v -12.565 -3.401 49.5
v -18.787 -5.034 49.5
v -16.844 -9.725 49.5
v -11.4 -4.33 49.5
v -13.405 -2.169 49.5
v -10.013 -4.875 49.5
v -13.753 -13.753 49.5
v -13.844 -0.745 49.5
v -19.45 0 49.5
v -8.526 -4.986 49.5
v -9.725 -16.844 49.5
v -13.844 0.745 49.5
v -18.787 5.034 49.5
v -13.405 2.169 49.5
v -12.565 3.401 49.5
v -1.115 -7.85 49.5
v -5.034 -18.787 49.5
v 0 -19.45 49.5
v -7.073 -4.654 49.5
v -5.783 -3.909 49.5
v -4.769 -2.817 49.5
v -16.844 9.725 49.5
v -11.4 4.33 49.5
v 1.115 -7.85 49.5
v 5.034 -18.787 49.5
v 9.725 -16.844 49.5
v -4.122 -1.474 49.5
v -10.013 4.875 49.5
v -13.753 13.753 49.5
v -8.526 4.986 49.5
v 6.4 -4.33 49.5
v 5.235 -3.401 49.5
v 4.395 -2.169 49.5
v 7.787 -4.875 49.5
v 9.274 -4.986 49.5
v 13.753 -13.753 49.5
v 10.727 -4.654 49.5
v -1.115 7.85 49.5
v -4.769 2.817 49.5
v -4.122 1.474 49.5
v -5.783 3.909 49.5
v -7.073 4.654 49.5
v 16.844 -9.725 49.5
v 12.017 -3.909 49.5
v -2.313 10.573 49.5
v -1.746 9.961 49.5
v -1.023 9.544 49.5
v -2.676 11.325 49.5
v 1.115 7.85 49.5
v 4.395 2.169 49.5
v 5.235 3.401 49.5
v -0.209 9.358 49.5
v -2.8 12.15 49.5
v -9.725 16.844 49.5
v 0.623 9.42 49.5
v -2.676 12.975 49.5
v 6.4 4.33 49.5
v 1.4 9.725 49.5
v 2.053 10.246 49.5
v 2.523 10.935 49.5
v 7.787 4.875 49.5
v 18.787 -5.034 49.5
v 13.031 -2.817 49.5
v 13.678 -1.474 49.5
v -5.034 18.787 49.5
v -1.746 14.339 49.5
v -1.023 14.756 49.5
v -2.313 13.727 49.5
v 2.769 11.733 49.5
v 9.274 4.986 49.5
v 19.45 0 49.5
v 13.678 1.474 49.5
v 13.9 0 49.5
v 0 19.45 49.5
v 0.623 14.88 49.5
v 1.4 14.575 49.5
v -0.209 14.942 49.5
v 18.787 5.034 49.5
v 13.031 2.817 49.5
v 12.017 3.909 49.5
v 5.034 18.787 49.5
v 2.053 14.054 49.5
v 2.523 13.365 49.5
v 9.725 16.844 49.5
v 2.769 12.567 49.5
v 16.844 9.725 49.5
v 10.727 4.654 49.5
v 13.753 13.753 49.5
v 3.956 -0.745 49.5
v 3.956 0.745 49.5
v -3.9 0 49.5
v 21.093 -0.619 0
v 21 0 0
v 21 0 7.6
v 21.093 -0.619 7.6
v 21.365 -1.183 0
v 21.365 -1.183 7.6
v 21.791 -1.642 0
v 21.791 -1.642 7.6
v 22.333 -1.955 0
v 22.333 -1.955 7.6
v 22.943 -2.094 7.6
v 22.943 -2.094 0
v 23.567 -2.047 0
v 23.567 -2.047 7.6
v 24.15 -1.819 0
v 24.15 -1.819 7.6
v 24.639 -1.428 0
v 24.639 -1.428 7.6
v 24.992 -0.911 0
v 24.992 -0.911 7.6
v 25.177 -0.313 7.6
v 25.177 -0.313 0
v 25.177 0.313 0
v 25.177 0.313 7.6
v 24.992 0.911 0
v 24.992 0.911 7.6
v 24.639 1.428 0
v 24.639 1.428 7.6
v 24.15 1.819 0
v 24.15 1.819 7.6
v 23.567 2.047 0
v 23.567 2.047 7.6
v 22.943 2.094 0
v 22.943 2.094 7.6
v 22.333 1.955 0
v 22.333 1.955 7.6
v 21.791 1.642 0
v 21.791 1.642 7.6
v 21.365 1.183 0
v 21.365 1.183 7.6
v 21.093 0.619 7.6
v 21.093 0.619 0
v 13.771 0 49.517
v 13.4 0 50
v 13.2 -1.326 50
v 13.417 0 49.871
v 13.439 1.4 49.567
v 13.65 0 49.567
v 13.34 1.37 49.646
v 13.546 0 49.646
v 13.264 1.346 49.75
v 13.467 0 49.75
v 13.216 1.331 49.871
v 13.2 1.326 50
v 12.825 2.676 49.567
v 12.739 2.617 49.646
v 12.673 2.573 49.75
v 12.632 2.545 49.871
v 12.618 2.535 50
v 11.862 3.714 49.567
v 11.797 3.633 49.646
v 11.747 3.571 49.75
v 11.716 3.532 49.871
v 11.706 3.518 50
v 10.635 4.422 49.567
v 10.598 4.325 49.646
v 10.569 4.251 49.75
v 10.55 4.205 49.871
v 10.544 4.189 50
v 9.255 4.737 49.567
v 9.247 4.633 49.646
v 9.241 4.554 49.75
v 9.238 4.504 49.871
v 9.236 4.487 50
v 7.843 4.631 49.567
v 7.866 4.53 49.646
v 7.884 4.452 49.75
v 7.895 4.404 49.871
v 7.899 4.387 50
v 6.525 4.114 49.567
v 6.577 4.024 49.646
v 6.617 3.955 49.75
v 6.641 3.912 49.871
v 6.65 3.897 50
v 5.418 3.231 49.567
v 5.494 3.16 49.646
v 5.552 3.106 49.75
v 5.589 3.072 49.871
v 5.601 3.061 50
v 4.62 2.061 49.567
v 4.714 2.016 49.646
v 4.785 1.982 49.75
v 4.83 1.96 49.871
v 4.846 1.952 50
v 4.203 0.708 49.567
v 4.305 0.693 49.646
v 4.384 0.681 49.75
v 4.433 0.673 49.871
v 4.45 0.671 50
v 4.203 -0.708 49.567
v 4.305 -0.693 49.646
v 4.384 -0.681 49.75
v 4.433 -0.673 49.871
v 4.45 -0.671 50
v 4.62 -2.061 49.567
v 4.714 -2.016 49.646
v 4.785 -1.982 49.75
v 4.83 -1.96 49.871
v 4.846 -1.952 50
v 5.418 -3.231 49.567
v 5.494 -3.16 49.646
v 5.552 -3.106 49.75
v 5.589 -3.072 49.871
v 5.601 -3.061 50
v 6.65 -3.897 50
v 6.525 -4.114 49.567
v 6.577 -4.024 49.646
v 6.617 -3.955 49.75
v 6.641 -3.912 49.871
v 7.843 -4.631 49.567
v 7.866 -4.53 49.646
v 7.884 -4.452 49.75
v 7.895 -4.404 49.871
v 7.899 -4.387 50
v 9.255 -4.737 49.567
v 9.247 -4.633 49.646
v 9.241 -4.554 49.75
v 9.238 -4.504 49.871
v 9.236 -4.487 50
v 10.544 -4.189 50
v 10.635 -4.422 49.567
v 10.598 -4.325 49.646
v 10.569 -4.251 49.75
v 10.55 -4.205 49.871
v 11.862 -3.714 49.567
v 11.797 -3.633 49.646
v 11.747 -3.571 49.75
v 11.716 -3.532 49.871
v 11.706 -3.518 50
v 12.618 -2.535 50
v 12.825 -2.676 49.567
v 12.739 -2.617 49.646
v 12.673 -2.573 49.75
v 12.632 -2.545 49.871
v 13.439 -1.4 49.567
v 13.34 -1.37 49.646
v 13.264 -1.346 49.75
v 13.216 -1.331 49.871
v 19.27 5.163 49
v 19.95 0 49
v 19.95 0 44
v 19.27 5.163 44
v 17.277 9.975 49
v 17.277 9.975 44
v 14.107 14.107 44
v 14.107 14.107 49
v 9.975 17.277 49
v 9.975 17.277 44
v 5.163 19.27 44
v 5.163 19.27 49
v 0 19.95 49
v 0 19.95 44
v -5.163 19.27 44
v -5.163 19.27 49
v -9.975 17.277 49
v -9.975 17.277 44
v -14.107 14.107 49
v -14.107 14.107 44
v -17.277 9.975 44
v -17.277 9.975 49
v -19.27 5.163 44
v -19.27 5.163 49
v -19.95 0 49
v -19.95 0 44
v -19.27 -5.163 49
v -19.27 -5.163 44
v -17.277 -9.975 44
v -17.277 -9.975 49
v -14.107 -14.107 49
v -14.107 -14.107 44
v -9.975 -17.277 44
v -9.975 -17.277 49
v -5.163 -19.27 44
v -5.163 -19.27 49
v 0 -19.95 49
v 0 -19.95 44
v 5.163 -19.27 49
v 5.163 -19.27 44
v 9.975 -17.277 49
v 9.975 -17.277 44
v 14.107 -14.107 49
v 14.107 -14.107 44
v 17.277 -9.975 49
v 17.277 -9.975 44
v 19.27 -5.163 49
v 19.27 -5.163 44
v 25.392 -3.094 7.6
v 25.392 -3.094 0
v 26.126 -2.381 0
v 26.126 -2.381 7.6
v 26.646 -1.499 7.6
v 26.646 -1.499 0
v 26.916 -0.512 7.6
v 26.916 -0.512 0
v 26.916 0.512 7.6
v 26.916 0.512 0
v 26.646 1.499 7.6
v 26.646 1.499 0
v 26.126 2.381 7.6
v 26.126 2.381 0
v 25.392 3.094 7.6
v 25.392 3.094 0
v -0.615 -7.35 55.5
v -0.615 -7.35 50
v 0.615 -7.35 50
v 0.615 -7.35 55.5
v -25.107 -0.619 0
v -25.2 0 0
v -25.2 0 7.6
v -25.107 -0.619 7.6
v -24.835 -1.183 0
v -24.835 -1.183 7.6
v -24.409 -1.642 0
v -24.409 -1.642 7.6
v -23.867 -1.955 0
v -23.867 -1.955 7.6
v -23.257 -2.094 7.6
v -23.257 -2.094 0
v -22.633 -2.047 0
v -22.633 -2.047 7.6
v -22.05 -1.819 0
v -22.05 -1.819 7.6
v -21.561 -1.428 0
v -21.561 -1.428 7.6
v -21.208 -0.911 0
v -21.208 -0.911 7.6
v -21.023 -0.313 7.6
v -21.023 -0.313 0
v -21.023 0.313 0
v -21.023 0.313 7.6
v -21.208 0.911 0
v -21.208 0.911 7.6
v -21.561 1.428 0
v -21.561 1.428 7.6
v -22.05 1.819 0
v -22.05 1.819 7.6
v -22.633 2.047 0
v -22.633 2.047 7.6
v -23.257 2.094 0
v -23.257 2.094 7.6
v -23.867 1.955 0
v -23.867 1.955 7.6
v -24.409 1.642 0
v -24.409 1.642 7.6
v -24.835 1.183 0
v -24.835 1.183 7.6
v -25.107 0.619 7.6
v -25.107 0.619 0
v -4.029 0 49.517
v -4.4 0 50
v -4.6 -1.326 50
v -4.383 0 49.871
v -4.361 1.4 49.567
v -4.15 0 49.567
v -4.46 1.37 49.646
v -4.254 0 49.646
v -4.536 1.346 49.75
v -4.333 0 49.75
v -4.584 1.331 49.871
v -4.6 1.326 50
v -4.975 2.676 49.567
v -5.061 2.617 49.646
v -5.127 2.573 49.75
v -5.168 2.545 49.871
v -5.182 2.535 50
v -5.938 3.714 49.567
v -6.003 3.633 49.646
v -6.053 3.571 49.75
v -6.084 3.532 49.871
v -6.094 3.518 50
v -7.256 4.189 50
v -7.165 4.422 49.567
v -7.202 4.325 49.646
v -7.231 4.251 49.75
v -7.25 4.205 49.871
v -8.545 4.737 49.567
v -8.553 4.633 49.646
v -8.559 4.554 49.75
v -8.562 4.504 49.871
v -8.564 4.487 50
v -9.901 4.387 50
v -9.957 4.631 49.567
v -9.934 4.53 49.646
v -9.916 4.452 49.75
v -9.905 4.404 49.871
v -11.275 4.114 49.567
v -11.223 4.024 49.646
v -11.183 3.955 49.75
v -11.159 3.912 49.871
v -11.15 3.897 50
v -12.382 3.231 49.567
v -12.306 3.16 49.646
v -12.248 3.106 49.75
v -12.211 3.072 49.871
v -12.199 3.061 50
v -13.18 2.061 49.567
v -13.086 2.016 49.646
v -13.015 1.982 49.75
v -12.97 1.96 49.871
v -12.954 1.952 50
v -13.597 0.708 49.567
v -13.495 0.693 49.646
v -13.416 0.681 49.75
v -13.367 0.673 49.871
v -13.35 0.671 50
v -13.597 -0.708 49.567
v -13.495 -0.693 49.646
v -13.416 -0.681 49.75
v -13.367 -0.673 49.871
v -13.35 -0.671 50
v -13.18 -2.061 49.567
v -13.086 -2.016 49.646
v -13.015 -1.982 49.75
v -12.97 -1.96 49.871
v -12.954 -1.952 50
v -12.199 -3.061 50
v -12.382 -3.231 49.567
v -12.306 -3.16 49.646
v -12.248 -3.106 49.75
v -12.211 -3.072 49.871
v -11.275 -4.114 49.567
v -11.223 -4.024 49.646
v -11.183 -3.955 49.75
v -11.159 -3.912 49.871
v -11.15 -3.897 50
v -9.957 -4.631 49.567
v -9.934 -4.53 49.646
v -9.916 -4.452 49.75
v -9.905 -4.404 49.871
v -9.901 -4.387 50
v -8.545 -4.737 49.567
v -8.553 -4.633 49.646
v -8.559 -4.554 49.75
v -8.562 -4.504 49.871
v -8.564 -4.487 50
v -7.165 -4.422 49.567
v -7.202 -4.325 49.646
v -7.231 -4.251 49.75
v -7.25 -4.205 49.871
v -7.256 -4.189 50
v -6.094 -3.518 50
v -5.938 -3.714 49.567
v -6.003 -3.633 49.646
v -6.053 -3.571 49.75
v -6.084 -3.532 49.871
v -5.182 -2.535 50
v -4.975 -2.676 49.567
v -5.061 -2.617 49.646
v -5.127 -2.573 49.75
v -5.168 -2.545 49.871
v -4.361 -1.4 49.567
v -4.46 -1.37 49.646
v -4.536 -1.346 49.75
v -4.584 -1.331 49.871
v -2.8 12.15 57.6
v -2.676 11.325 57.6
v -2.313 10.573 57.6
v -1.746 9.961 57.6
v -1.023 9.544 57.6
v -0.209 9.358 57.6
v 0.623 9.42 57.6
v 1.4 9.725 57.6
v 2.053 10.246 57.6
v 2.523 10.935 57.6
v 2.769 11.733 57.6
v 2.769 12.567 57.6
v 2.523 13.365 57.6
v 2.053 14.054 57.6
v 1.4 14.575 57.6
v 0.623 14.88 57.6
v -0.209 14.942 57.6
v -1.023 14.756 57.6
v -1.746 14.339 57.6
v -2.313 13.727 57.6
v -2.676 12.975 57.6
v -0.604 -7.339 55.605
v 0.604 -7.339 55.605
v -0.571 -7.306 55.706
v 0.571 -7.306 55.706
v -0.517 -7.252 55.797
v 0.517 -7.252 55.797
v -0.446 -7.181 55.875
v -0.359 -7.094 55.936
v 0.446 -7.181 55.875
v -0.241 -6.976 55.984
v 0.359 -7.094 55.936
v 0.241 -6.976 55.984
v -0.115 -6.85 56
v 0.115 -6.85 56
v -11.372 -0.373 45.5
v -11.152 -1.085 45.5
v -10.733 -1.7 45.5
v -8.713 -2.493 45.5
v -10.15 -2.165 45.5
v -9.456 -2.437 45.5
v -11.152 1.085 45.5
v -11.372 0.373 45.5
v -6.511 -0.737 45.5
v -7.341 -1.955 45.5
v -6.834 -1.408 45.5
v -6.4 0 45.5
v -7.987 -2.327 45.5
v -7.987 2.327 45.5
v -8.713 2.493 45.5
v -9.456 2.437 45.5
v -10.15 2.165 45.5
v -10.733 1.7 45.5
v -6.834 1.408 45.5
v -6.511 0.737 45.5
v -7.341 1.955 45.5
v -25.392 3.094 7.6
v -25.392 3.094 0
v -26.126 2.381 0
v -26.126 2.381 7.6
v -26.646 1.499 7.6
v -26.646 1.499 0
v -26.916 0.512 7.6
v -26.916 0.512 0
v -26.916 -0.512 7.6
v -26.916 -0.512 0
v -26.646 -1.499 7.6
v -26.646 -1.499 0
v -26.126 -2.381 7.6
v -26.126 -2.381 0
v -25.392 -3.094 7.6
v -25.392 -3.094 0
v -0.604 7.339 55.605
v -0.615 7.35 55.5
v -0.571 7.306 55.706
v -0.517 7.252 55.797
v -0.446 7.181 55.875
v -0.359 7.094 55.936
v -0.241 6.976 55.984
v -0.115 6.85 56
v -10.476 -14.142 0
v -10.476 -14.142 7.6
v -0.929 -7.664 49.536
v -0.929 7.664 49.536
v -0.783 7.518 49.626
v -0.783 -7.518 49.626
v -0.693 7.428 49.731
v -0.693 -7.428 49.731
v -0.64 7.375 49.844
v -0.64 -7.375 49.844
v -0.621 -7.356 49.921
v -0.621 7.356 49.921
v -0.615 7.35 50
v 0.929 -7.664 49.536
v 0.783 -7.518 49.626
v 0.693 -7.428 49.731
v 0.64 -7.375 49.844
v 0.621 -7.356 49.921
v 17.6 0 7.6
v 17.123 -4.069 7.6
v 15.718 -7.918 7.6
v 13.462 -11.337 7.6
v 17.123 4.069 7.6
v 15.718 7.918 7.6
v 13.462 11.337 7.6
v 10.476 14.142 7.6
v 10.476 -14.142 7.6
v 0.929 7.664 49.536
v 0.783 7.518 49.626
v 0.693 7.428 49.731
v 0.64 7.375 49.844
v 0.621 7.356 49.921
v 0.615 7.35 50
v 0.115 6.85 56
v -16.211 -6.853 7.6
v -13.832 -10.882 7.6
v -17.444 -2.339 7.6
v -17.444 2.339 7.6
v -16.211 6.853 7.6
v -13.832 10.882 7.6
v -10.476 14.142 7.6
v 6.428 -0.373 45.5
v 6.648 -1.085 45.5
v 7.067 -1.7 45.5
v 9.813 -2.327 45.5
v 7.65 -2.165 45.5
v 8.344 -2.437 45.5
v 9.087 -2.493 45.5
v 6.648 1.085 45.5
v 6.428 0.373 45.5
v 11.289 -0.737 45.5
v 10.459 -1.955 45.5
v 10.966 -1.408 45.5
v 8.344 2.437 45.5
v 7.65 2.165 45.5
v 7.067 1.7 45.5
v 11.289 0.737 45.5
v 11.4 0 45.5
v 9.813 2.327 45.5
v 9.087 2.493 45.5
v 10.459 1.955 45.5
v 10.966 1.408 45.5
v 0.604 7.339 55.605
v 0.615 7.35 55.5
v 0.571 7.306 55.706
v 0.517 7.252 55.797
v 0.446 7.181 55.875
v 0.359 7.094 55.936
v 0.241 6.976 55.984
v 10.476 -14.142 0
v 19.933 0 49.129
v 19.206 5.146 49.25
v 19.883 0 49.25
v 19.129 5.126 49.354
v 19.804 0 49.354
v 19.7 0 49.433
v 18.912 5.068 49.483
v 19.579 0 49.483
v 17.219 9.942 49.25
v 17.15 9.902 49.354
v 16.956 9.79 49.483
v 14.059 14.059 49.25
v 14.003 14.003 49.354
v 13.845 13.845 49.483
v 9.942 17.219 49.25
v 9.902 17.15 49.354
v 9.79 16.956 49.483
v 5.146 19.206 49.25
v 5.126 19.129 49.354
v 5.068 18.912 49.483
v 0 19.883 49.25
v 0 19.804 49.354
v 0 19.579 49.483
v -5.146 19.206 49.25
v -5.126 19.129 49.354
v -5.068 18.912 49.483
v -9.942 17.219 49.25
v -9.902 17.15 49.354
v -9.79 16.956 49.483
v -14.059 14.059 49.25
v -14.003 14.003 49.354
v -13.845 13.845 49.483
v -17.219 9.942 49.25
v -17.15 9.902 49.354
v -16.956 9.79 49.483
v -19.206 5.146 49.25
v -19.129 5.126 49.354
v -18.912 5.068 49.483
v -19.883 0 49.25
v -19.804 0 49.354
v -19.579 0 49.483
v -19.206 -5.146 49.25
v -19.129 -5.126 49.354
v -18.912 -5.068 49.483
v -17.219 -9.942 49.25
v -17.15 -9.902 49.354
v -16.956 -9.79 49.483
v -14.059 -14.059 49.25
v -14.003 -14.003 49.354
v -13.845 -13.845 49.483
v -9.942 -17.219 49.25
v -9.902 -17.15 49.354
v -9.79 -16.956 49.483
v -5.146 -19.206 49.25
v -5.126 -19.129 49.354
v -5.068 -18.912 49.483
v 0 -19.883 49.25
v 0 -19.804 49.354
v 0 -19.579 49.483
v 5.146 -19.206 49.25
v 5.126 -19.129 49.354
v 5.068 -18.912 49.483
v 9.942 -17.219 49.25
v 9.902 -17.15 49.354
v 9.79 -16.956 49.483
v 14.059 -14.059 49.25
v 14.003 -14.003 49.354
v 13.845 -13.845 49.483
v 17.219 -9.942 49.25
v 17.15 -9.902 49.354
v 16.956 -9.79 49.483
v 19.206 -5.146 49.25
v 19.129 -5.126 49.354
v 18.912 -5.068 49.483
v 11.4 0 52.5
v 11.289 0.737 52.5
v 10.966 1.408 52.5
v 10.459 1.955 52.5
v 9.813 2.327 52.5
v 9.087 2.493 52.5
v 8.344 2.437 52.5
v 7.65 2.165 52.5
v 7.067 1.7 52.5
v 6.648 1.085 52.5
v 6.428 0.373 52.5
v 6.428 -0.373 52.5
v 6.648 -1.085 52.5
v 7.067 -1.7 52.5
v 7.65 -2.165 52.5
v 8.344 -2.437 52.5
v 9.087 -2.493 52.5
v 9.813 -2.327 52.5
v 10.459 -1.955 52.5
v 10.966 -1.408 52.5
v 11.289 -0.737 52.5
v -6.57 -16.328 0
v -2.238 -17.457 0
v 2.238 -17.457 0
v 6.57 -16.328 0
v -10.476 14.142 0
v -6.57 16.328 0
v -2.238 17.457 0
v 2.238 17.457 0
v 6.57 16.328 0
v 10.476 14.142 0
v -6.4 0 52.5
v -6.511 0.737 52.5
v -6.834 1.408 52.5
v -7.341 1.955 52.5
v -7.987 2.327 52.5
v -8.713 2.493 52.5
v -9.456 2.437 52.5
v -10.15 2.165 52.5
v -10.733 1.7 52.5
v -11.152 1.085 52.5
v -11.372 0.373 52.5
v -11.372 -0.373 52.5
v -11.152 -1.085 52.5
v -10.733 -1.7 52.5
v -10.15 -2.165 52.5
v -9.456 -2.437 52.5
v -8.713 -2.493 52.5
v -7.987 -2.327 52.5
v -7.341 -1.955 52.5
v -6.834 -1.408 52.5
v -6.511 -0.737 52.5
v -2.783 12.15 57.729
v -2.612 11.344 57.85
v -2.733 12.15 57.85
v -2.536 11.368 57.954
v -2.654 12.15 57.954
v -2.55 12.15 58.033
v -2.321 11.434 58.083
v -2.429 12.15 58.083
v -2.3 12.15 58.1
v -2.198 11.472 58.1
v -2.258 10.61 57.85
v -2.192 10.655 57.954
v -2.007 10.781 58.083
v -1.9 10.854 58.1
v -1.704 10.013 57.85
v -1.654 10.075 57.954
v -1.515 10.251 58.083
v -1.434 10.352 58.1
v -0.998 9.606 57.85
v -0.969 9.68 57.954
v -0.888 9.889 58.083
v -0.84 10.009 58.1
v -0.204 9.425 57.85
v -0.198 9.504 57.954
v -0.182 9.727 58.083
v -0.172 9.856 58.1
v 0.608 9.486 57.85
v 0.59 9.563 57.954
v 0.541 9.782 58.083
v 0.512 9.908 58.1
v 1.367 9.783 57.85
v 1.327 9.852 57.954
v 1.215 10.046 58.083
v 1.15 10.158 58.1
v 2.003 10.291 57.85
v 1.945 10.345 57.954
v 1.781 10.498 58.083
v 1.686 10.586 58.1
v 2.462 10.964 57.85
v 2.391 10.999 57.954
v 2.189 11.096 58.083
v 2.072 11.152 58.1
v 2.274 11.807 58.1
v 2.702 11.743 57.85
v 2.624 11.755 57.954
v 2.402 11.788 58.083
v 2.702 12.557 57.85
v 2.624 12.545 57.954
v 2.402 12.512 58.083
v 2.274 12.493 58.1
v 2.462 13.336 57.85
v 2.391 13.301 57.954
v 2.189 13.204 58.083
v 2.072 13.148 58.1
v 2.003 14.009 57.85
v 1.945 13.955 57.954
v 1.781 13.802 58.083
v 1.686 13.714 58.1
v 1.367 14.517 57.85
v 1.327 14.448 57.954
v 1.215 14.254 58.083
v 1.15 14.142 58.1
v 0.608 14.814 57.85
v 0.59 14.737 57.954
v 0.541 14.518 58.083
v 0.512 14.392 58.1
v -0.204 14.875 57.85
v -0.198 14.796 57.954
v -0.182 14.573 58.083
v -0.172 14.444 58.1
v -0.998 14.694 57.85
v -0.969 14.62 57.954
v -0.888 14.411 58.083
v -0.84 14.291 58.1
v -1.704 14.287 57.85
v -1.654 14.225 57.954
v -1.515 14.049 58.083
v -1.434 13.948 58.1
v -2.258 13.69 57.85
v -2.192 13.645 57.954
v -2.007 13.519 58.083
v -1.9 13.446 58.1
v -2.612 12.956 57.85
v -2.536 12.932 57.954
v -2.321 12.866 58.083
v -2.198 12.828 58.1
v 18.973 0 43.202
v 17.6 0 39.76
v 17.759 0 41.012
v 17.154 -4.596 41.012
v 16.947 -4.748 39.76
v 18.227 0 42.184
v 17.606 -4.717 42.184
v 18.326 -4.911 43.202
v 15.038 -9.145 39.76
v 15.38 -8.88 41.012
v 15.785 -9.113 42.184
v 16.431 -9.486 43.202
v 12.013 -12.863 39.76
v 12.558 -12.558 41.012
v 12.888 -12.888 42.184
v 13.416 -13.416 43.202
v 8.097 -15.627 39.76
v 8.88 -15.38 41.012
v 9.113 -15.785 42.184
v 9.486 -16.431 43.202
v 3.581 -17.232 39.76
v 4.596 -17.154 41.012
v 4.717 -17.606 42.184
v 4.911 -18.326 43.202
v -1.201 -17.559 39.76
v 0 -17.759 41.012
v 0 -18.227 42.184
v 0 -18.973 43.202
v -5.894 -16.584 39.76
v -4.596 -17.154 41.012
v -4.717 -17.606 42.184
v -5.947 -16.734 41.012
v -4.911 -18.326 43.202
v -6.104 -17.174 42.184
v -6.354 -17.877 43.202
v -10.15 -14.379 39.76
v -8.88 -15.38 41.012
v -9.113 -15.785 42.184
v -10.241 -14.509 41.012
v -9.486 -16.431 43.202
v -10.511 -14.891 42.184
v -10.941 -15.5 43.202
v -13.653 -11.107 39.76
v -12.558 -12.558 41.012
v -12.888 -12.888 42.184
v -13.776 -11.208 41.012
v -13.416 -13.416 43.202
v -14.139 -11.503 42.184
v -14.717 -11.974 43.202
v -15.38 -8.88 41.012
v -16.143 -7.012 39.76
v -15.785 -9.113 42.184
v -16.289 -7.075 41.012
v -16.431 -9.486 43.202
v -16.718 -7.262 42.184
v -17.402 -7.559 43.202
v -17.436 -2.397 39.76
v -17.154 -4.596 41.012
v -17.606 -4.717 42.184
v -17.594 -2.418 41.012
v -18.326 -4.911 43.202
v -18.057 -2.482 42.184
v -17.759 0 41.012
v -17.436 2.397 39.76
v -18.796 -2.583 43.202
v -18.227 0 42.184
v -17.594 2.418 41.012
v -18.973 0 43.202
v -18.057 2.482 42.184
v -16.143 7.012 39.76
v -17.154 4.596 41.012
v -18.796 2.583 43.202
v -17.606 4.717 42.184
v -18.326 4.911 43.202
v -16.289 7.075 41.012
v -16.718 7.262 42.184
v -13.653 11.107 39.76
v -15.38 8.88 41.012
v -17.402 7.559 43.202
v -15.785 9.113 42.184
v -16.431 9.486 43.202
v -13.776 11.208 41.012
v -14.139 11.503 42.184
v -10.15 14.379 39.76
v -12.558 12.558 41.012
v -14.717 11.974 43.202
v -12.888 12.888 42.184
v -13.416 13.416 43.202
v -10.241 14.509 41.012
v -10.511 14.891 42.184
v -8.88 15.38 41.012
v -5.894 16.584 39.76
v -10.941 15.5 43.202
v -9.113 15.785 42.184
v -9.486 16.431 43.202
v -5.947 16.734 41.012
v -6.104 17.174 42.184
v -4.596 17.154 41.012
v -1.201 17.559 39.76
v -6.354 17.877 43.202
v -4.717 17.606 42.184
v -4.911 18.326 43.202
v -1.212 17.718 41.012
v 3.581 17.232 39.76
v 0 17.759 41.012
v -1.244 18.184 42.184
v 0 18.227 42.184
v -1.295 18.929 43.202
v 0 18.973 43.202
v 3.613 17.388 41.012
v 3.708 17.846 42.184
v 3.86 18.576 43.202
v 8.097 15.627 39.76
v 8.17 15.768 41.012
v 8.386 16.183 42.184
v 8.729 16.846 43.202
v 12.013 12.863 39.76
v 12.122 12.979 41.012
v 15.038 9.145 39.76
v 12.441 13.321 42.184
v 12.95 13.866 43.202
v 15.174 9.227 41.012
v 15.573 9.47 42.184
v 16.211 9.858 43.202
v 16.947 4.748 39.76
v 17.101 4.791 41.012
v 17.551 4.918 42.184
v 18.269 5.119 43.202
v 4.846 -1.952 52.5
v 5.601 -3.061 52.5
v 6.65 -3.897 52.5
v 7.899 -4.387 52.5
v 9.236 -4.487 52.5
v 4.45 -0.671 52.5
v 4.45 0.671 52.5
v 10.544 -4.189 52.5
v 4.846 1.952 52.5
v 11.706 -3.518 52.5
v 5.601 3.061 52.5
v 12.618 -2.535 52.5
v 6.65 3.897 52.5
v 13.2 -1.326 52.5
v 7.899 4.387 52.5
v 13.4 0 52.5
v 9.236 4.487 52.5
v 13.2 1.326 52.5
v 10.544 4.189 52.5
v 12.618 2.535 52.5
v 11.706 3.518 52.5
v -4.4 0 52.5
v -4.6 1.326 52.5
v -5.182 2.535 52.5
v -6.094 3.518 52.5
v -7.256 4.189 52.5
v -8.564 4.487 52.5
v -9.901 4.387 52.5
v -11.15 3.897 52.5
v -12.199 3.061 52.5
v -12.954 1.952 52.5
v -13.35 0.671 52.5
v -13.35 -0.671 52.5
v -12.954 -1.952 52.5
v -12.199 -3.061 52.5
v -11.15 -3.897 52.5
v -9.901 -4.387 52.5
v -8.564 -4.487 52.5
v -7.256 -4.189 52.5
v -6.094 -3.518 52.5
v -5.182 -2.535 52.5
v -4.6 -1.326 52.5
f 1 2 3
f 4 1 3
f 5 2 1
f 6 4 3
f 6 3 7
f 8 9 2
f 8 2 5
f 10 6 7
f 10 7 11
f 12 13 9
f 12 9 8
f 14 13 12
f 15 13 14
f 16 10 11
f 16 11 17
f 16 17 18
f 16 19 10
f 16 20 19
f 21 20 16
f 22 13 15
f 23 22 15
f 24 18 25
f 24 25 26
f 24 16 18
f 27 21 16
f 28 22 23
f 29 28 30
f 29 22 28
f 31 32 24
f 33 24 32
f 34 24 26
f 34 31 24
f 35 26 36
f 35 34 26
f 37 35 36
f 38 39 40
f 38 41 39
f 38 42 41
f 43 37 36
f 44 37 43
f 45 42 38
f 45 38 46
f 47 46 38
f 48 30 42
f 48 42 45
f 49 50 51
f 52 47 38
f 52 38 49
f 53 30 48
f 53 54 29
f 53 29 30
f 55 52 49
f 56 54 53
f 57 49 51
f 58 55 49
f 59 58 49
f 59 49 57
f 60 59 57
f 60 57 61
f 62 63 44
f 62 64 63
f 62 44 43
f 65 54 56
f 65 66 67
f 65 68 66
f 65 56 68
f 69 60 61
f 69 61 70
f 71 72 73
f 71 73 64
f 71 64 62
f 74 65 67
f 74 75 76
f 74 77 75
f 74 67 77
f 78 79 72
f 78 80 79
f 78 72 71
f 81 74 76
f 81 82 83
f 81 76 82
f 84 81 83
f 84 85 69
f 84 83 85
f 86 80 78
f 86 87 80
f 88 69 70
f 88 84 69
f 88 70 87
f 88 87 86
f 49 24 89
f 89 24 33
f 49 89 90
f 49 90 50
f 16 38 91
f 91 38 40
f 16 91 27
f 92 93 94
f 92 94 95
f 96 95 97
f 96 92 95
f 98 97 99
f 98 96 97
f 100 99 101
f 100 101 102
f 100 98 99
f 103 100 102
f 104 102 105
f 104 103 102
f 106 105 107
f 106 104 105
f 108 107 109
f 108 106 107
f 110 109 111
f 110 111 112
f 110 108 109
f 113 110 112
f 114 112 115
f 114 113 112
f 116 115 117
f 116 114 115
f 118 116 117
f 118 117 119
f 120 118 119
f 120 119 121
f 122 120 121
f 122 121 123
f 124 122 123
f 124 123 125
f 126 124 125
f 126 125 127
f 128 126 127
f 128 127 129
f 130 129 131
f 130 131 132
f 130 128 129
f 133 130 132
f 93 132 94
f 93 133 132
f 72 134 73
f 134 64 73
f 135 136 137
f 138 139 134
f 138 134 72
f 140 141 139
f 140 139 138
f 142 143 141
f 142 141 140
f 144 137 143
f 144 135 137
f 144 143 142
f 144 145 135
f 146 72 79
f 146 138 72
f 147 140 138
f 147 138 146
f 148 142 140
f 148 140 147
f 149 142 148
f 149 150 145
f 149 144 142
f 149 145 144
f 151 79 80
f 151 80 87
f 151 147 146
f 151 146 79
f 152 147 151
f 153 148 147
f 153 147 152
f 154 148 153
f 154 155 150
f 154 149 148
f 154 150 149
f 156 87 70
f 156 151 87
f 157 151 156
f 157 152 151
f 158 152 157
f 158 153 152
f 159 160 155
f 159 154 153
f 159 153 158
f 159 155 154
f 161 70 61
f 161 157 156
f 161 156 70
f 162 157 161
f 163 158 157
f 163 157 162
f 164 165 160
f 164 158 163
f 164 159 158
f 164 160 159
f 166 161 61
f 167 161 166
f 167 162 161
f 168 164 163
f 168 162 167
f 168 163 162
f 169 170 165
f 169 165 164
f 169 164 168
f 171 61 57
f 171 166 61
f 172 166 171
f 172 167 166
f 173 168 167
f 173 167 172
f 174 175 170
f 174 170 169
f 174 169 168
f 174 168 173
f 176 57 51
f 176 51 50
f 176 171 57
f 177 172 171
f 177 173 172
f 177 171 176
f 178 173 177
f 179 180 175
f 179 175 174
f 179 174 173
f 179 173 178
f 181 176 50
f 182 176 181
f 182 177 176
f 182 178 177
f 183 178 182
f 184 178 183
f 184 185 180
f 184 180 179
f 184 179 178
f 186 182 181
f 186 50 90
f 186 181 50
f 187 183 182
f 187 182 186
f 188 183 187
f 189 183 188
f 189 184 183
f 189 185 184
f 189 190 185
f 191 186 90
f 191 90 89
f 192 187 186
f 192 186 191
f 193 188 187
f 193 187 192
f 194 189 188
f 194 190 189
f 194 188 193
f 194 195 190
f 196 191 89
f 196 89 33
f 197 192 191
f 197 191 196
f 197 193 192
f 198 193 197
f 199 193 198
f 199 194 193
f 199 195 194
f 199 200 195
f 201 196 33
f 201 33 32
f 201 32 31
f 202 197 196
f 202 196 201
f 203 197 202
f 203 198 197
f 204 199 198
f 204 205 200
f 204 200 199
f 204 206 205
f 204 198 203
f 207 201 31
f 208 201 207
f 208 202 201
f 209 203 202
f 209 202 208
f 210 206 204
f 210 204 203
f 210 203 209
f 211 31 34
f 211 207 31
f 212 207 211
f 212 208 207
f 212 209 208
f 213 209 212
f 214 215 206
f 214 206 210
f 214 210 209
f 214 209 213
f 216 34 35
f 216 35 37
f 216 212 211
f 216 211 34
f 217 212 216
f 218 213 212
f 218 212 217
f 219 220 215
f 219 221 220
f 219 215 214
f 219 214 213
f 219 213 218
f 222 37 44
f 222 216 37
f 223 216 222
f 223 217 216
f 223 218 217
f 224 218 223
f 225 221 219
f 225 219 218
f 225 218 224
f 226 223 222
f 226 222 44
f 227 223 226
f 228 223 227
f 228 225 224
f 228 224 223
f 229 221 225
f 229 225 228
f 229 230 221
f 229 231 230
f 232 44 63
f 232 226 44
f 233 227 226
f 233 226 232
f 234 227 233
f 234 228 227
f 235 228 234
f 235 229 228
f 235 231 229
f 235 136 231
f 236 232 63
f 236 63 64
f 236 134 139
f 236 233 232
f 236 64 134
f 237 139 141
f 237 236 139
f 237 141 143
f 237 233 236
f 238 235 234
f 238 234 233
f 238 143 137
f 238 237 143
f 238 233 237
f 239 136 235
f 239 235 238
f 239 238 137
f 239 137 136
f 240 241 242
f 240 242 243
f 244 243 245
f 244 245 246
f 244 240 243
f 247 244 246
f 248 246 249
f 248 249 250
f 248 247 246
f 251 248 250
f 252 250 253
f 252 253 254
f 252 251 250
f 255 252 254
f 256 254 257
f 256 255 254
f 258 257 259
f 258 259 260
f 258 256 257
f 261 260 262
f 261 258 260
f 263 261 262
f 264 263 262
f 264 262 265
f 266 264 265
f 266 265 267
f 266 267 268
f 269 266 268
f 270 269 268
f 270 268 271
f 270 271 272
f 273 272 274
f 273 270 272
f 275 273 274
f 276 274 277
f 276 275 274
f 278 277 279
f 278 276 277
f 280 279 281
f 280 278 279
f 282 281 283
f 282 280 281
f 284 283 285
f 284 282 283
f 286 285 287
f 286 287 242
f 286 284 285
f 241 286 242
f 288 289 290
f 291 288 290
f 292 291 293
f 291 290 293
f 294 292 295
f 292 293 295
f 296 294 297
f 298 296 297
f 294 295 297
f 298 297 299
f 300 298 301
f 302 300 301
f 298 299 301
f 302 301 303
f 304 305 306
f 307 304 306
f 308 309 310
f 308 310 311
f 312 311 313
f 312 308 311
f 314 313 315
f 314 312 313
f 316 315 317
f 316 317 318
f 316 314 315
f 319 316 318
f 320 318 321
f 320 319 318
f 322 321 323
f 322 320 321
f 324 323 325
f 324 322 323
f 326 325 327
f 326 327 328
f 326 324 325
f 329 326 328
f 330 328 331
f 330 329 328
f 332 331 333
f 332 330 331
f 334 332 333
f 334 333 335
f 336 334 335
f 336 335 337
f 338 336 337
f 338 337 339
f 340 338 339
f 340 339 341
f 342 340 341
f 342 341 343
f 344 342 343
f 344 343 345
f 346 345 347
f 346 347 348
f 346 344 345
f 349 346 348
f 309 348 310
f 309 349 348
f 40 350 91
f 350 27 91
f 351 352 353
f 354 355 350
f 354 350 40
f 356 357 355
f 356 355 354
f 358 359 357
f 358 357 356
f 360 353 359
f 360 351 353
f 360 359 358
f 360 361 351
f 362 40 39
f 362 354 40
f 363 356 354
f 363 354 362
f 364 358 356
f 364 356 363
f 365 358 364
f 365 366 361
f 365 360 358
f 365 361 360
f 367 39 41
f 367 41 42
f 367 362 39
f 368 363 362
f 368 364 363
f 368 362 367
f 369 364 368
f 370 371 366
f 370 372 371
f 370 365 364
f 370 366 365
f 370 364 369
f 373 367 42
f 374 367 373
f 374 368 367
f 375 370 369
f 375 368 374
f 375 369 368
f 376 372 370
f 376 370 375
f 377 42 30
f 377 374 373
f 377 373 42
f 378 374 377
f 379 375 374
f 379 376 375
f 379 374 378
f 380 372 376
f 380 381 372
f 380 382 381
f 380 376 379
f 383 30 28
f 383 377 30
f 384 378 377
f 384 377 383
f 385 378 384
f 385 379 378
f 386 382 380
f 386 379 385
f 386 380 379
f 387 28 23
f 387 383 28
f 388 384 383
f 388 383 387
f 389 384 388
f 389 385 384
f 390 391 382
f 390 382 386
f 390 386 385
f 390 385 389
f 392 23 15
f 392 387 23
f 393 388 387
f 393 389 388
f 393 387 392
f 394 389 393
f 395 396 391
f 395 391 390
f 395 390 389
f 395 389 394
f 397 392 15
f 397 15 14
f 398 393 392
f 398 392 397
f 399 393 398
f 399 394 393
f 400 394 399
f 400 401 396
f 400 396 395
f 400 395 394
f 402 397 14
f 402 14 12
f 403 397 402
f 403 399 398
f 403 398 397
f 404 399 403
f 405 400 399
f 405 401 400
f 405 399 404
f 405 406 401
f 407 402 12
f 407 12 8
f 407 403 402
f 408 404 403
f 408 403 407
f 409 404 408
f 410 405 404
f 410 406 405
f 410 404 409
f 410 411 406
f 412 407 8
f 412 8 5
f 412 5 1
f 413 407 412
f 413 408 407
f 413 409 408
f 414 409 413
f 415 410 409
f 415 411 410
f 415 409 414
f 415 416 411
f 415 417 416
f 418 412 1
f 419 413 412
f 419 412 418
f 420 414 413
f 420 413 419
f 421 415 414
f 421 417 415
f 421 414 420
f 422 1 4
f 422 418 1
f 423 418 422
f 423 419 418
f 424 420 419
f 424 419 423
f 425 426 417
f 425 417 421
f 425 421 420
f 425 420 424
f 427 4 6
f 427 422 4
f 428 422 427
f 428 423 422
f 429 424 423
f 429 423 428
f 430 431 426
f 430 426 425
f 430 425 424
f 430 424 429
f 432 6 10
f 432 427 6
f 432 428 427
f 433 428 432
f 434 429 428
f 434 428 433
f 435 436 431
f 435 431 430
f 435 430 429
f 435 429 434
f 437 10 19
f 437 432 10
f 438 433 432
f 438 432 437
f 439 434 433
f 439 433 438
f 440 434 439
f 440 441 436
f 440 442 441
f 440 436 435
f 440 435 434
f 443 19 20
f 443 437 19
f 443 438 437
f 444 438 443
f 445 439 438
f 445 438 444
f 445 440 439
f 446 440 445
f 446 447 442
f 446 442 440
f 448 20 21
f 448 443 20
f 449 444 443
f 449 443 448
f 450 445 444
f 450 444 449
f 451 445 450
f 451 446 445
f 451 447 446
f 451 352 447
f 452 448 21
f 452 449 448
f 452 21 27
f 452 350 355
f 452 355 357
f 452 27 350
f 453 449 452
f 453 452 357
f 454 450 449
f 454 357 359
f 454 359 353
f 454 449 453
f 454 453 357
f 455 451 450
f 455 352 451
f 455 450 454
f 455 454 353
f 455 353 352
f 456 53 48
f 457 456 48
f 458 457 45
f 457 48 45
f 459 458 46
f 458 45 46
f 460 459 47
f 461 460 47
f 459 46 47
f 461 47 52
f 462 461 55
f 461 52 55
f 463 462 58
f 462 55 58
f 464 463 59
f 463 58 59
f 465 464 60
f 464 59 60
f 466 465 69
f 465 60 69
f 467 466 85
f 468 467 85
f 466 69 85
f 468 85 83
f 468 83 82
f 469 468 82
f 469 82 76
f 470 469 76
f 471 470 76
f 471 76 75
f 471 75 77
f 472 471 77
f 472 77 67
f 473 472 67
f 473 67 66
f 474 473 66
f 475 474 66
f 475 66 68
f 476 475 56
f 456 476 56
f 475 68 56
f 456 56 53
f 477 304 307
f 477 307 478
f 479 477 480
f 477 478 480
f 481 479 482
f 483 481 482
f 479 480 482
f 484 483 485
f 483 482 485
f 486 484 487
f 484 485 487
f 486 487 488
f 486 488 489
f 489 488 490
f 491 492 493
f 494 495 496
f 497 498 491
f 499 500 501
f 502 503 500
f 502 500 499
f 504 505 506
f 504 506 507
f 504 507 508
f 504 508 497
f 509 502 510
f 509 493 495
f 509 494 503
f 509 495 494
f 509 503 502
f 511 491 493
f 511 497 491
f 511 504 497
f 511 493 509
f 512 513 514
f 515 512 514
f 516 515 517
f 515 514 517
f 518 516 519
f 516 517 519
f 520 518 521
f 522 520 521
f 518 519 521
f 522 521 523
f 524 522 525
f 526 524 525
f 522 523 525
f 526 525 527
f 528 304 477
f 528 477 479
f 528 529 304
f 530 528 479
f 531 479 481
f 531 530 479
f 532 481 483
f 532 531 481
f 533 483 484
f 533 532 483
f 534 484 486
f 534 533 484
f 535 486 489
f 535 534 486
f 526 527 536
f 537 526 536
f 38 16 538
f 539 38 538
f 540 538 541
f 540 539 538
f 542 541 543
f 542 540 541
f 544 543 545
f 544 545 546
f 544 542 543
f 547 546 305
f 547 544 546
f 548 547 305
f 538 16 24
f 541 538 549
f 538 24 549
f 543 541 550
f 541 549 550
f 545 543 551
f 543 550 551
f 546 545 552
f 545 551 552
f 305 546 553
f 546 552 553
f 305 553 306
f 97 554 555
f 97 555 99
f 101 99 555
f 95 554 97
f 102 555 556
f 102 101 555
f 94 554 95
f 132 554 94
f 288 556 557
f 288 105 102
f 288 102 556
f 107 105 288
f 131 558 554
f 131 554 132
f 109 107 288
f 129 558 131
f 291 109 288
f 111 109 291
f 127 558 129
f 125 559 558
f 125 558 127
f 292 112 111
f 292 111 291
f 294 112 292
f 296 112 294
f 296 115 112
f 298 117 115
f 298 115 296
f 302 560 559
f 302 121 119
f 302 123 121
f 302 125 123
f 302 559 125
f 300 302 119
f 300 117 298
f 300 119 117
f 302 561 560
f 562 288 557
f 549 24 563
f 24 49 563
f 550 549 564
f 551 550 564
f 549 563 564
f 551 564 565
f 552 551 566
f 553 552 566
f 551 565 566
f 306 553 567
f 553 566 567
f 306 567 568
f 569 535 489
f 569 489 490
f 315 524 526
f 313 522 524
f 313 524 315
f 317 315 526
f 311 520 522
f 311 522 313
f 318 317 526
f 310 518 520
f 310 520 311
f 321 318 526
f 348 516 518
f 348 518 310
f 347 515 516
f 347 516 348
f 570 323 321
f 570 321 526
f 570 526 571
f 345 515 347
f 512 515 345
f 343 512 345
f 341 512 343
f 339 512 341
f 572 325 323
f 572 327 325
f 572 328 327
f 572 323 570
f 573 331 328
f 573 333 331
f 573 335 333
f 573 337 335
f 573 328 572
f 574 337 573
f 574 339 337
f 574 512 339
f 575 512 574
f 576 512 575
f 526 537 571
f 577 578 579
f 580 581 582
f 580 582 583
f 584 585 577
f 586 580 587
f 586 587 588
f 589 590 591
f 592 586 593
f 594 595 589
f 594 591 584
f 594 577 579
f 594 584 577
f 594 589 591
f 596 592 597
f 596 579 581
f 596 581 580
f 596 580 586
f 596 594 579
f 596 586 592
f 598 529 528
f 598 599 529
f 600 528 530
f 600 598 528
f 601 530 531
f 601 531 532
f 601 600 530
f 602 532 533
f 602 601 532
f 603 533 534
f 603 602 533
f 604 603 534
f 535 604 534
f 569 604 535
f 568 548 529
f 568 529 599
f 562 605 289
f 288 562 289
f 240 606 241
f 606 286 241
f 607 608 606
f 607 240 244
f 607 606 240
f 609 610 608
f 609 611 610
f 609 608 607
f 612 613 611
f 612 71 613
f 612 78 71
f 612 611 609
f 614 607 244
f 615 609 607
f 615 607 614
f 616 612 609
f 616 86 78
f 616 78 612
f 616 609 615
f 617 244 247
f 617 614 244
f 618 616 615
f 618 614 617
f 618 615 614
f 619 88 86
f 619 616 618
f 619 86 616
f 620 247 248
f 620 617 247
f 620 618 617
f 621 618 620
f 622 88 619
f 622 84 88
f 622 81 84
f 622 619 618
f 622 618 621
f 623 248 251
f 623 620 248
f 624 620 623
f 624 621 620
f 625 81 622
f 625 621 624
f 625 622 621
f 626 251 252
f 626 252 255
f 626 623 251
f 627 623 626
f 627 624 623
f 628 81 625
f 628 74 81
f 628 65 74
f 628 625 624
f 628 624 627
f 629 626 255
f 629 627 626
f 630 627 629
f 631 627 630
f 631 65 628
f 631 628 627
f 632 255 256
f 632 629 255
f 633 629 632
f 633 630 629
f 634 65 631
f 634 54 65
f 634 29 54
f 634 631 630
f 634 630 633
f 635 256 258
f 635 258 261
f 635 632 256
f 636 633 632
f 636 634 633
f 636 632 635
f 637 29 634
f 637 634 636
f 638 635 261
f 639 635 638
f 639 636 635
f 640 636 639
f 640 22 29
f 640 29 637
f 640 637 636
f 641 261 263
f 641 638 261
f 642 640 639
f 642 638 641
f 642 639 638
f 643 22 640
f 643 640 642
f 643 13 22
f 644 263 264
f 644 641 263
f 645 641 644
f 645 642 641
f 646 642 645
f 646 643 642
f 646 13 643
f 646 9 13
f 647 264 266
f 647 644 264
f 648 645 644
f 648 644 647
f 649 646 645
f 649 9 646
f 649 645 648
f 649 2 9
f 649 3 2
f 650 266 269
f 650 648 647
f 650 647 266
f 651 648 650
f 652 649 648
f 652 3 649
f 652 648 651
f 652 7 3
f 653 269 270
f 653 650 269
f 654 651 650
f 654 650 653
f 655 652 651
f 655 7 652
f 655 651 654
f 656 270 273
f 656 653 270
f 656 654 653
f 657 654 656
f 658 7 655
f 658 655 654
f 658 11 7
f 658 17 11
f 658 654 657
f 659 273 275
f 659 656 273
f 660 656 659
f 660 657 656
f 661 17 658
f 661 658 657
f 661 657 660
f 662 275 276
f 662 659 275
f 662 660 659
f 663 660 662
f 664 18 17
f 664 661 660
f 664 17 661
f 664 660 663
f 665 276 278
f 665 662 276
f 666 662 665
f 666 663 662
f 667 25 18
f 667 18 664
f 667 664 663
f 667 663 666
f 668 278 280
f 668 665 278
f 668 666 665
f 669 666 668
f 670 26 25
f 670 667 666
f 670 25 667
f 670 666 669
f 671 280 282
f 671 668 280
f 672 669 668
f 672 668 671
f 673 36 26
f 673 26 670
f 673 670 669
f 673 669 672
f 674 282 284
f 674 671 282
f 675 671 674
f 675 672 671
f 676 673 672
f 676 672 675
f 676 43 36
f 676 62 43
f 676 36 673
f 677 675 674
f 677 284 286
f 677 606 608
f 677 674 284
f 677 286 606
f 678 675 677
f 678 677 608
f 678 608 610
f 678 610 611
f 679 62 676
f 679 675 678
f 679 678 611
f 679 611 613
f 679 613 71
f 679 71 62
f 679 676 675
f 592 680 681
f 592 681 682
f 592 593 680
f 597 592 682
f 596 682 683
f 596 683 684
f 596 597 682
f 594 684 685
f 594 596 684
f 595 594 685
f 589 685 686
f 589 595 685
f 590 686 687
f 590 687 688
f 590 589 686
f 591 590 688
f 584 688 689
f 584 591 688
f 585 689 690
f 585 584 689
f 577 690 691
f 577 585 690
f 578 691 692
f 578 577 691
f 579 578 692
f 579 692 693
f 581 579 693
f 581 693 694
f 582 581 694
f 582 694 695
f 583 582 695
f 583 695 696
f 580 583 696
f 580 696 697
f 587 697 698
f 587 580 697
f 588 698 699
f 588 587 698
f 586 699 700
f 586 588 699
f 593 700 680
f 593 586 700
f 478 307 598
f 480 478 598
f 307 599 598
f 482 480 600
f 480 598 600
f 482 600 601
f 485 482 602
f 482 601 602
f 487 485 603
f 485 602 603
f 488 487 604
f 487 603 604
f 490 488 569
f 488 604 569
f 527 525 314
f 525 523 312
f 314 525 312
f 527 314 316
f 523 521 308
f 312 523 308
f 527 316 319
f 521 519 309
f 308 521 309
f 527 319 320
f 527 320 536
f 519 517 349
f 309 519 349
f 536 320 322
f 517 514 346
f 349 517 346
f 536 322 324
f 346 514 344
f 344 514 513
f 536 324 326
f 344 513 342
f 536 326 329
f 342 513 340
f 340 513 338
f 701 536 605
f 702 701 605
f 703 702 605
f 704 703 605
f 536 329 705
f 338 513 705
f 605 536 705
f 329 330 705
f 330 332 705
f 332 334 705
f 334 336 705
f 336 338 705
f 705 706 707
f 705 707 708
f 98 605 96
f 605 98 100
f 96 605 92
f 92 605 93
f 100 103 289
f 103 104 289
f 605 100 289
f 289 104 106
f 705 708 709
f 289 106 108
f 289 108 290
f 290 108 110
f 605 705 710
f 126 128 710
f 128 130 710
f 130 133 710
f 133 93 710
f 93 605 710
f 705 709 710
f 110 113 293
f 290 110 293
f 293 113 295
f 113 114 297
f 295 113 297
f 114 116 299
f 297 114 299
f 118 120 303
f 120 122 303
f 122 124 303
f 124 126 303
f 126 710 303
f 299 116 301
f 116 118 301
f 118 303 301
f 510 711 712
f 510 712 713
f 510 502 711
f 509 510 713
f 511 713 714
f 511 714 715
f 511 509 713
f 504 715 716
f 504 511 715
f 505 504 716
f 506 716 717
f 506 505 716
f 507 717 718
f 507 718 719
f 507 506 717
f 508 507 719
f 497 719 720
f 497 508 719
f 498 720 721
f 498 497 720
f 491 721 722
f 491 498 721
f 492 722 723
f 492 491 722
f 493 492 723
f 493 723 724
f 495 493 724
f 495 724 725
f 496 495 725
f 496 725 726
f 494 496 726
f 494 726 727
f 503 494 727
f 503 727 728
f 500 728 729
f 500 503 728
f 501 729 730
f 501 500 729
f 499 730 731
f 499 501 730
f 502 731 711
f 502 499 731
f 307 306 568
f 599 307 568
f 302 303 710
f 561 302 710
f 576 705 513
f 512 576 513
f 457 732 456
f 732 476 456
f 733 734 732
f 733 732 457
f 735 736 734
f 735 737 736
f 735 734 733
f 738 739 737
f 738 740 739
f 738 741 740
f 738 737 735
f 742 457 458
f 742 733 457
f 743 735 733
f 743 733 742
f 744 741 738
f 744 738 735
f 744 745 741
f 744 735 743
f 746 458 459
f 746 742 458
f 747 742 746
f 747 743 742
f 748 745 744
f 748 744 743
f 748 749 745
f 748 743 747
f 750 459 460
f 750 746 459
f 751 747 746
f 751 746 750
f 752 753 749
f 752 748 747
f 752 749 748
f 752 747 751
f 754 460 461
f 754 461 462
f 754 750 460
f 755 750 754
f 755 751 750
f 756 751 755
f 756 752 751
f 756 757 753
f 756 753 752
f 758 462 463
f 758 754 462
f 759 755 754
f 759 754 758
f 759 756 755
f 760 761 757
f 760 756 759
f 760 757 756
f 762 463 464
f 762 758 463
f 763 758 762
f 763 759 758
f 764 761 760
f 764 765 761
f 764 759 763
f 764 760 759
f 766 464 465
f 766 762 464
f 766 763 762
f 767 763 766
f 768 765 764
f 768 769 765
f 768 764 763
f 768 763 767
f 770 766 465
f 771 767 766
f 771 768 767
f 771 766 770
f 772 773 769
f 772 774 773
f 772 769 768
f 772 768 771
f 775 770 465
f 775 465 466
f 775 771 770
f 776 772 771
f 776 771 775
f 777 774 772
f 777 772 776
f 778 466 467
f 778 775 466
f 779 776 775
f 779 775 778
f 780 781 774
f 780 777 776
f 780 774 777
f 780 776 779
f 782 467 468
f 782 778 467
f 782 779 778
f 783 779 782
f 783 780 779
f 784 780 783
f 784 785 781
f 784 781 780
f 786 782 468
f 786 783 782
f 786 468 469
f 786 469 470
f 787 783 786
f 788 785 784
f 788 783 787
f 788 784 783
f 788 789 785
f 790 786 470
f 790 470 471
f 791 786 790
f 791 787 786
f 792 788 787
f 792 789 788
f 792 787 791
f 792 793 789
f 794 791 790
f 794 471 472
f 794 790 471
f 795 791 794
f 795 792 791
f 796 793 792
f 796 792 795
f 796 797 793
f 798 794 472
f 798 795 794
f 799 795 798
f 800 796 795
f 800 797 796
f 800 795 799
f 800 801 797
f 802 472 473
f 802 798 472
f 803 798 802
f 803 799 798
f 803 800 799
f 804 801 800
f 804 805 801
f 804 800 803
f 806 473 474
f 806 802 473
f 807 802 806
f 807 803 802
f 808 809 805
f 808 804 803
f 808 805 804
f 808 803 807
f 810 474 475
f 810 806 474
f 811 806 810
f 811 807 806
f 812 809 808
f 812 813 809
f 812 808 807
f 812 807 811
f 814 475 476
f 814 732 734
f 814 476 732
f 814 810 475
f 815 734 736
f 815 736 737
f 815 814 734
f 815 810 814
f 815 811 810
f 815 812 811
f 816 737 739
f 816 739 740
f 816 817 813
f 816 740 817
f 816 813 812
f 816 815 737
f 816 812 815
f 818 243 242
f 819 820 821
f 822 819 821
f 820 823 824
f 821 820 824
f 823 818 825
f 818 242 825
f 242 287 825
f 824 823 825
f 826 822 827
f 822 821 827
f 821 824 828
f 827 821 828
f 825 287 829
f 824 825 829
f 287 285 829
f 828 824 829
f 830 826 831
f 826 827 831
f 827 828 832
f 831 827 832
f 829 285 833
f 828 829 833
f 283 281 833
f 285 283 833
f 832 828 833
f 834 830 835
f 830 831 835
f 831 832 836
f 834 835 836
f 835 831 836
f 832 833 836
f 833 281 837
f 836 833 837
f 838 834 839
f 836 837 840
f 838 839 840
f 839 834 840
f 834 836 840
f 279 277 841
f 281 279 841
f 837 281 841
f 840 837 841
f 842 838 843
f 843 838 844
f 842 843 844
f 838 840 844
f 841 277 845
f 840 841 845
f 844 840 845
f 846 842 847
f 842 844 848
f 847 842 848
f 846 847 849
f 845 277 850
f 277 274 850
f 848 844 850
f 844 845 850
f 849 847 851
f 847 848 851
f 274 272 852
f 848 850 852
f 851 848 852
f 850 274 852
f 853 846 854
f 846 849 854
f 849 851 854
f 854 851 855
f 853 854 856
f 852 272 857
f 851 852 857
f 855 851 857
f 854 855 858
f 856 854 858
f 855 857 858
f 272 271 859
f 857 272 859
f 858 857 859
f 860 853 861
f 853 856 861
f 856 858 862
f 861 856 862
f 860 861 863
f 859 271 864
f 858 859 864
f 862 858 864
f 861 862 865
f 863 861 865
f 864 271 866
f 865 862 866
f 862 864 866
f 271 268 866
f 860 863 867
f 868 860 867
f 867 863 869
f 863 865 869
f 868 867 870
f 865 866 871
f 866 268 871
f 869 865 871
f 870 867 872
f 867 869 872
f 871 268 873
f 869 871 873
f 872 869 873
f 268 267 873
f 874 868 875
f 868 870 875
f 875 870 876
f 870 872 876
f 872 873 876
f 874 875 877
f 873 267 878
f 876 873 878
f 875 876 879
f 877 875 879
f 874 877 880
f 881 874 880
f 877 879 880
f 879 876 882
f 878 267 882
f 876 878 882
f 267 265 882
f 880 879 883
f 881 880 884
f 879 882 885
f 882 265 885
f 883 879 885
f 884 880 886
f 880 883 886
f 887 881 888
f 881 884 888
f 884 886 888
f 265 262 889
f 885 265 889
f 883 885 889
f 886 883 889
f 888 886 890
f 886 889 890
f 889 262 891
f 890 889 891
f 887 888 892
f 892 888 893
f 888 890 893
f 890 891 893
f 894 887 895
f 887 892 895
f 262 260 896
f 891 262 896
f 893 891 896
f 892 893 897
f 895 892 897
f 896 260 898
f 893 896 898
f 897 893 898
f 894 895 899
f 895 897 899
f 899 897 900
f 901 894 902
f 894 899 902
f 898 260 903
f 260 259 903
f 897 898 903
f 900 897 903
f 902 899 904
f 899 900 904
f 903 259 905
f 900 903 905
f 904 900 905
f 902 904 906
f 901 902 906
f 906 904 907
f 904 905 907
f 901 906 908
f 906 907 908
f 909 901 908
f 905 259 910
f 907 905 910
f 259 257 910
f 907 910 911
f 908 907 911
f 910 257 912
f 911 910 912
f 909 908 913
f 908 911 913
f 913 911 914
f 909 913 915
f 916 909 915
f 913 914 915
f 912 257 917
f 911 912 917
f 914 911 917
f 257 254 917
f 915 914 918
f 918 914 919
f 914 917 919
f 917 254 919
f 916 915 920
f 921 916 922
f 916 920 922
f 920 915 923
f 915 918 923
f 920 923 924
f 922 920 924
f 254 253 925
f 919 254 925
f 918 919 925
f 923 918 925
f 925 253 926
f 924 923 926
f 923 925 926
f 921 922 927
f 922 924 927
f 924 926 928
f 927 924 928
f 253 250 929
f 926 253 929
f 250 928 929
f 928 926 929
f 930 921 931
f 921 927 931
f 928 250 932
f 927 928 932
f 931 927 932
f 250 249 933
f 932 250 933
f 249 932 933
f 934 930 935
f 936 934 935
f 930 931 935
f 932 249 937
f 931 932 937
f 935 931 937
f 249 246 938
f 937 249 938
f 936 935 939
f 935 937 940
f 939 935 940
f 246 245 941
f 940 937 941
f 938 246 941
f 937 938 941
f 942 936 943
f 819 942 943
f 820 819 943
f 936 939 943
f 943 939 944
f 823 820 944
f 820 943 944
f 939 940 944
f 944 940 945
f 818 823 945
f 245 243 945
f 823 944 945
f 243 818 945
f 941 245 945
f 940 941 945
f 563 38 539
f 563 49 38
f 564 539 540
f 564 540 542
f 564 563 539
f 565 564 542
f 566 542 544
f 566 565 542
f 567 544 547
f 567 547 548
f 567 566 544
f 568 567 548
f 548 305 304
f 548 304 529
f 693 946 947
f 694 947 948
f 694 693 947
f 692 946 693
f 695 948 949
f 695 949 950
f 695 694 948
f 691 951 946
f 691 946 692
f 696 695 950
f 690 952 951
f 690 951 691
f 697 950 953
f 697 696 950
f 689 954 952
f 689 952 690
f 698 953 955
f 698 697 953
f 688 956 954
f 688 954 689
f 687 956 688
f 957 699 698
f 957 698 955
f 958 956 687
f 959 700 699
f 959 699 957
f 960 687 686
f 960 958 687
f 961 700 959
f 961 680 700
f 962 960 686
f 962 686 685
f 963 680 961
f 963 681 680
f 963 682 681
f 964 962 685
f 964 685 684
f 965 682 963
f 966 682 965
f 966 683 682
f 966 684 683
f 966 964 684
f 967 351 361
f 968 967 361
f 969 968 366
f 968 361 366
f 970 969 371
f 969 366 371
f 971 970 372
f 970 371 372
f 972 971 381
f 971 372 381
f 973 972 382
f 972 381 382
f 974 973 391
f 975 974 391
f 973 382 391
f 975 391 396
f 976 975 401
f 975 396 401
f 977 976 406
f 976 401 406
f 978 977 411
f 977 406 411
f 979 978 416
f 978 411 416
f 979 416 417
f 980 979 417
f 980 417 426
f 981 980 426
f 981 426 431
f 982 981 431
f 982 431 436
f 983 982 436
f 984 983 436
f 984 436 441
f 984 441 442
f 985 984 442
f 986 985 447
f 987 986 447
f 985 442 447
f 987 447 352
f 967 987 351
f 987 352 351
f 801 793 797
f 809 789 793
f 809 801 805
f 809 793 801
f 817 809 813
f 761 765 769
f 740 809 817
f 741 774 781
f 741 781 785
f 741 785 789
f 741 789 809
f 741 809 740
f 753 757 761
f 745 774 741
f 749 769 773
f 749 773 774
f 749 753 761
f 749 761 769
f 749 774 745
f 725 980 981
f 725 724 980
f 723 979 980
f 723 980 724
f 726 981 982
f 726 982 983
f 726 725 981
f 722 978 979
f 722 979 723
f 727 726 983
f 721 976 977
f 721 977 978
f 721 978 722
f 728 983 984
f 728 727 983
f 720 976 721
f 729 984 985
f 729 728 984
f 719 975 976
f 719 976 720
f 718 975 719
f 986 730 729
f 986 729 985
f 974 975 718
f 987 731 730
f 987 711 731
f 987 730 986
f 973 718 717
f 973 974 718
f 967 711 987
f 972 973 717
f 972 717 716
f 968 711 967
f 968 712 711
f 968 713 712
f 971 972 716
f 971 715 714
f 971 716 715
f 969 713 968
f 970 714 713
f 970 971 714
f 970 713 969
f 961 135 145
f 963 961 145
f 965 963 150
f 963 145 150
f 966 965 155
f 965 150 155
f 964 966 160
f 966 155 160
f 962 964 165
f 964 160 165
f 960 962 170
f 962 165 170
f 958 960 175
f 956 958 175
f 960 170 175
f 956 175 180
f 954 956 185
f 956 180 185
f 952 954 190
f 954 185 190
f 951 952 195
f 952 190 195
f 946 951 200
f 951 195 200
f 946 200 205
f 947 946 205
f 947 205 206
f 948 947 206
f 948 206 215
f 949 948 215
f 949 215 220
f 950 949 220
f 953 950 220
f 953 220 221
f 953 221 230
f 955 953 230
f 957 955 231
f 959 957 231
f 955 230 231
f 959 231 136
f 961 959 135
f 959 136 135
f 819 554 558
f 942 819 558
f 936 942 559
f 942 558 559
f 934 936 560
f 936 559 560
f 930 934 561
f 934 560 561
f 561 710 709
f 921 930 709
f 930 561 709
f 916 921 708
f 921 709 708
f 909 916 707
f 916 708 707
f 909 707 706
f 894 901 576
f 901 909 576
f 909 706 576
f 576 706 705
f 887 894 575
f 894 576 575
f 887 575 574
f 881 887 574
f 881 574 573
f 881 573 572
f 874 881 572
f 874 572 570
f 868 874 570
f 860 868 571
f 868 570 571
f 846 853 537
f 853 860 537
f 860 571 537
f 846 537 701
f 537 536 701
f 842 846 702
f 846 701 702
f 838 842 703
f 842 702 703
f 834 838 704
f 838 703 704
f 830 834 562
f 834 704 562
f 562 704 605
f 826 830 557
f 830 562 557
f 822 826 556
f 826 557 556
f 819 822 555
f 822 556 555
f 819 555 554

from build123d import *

# Parameters (mm, degrees)
SKETCH2_R           = 17.6
BOSS_EXTRUDE1_DEPTH = 52.5
SKETCH3_R           = 2.1
BOSS_EXTRUDE2_DEPTH = 7.6
SKETCH4_W           = 1.23
SKETCH4_H           = 14.7
BOSS_EXTRUDE3_DEPTH = 3.5
CUT_EXTRUDE1_START  = -3
SKETCH5_R           = 17.6
SKETCH5_R_2         = 4.5
SKETCH5_W           = 1.23
SKETCH5_H           = 14.7
SKETCH5_R_3         = 2.5
CUT_EXTRUDE1_DEPTH  = 3
SKETCH7_R           = 19.95
BOSS_EXTRUDE5_DEPTH = 5.5
FILLET3_R           = 5
FILLET4_R           = 0.5
CUT_EXTRUDE2_START  = -7
SKETCH8_R           = 2.5
CUT_EXTRUDE2_DEPTH  = 7
SKETCH10_R          = 2.8
BOSS_EXTRUDE6_DEPTH = 8.6
FILLET5_R           = 0.5


with BuildPart() as part:
    # Sketch2 → Boss-Extrude1 (new body)
    with BuildSketch(Plane.XY):
        Circle(SKETCH2_R)
    extrude(amount=BOSS_EXTRUDE1_DEPTH)

    # Sketch3 → Boss-Extrude2 (add)
    # profile 1 of 2: a face of its own
    with BuildSketch(Plane.XY):
        with BuildLine():
            Line((-10.476190476, 14.14246913), (-25.391666667, 3.093665122))
            ThreePointArc((-25.391666667, 3.093665122), (-26.95, 0), (-25.391666667, -3.093665122))
            Line((-25.391666667, -3.093665122), (-10.476190476, -14.14246913))
            ThreePointArc((-10.476190476, -14.14246913), (-17.6, 0), (-10.476190476, 14.14246913))
        make_face()
        with Locations(Location((-23.1, 0, 0), (0, 0, 180))):
            Circle(SKETCH3_R, mode=Mode.SUBTRACT)
    # profile 2 of 2: a face of its own
    with BuildSketch(Plane.XY):
        with BuildLine():
            Line((25.391666667, 3.093665122), (10.476190476, 14.14246913))
            ThreePointArc((10.476190476, 14.14246913), (17.6, 0), (10.476190476, -14.14246913))
            Line((10.476190476, -14.14246913), (25.391666667, -3.093665122))
            ThreePointArc((25.391666667, -3.093665122), (26.95, 0), (25.391666667, 3.093665122))
        make_face()
        with Locations(Location((23.1, 0, 0), (0, 0, 180))):
            Circle(SKETCH3_R, mode=Mode.SUBTRACT)
    extrude(amount=BOSS_EXTRUDE2_DEPTH)

    # Sketch4 → Boss-Extrude3 (add)
    with BuildSketch(Plane.XY.offset(52.5)):
        Rectangle(SKETCH4_W, SKETCH4_H)
    extrude(amount=BOSS_EXTRUDE3_DEPTH)

    # Sketch5 → Cut-Extrude1 (cut)
    # profile 1 of 3: a face of its own
    with BuildSketch(Plane.XY.offset(52.5).offset(CUT_EXTRUDE1_START)):
        with Locations(Location((0, 0, 0), (0, 0, 126.52960723))):
            Circle(SKETCH5_R)
        with Locations((-8.9, 0)):
            Circle(SKETCH5_R_2, mode=Mode.SUBTRACT)
        with Locations((8.9, 0)):
            Circle(SKETCH5_R_2, mode=Mode.SUBTRACT)
        Rectangle(SKETCH5_W, SKETCH5_H, mode=Mode.SUBTRACT)
    # profile 2 of 3: a face of its own
    with BuildSketch(Plane.XY.offset(52.5).offset(CUT_EXTRUDE1_START)):
        with Locations((-8.9, 0)):
            Circle(SKETCH5_R_3)
    # profile 3 of 3: a face of its own
    with BuildSketch(Plane.XY.offset(52.5).offset(CUT_EXTRUDE1_START)):
        with Locations((8.9, 0)):
            Circle(SKETCH5_R_3)
    extrude(amount=CUT_EXTRUDE1_DEPTH, mode=Mode.SUBTRACT)

    # Sketch7 → Boss-Extrude5 (add)
    with BuildSketch(Plane.XY.offset(49.5)):
        Circle(SKETCH7_R)
    extrude(amount=-BOSS_EXTRUDE5_DEPTH)

    # Fillet3
    # the kernel refuses this fillet: 5 mm, written as the material it adds along each edge
    with BuildSketch(Plane(origin=(0, 0, 44), x_dir=(1, 0, 0), z_dir=(0, 1, 0))) as fillet3_piece_1:
        with BuildLine():
            CenterArc((22.6, 4.239988208), FILLET3_R, 180, 57.994545172)
            Line((19.95, 0), (19.897, -0.084799764))
            ThreePointArc((19.897, -0.084799764), (18.775, -0.1), (17.6, -0.1))
            Line((17.6, -0.1), (17.5, 0))
            Line((17.5, 0), (17.5, 4.239988208))
            Line((17.5, 4.239988208), (17.6, 4.239988208))
        make_face()
    revolve(axis=Axis((0, 0, 44), (0, 0, -1)))

    # Fillet4
    fillet4_edges = [part.edges().sort_by_distance(p)[0] for p in [
        (0.615, 0, 56),
        (0, 7.35, 56),
        (0, -7.35, 56),
        (-0.615, 0, 56),
        (0, 7.35, 49.5),
        (-0.615, 0, 49.5),
        (0, -7.35, 49.5),
        (0.615, 0, 49.5),
        (-13.4, 0, 49.5),
        (4.4, 0, 49.5),
        (-19.95, 0, 49.5),
    ]]
    fillet(fillet4_edges, radius=FILLET4_R)

    # Sketch8 → Cut-Extrude2 (cut)
    with BuildSketch(Plane.XY.offset(52.5).offset(CUT_EXTRUDE2_START)):
        with Locations((8.9, 0)):
            Circle(SKETCH8_R)
        with Locations((-8.9, 0)):
            Circle(SKETCH8_R)
    extrude(amount=CUT_EXTRUDE2_DEPTH, mode=Mode.SUBTRACT)

    # Sketch10 → Boss-Extrude6 (add)
    with BuildSketch(Plane.XY.offset(49.5)):
        with Locations(Location((0, 12.15, 0), (0, 0, 180))):
            Circle(SKETCH10_R)
    extrude(amount=BOSS_EXTRUDE6_DEPTH)

    # Fillet5
    fillet5_edges = [part.edges().sort_by_distance(p)[0] for p in [
        (2.8, 12.15, 58.1),
    ]]
    fillet(fillet5_edges, radius=FILLET5_R)


solid = part.part
